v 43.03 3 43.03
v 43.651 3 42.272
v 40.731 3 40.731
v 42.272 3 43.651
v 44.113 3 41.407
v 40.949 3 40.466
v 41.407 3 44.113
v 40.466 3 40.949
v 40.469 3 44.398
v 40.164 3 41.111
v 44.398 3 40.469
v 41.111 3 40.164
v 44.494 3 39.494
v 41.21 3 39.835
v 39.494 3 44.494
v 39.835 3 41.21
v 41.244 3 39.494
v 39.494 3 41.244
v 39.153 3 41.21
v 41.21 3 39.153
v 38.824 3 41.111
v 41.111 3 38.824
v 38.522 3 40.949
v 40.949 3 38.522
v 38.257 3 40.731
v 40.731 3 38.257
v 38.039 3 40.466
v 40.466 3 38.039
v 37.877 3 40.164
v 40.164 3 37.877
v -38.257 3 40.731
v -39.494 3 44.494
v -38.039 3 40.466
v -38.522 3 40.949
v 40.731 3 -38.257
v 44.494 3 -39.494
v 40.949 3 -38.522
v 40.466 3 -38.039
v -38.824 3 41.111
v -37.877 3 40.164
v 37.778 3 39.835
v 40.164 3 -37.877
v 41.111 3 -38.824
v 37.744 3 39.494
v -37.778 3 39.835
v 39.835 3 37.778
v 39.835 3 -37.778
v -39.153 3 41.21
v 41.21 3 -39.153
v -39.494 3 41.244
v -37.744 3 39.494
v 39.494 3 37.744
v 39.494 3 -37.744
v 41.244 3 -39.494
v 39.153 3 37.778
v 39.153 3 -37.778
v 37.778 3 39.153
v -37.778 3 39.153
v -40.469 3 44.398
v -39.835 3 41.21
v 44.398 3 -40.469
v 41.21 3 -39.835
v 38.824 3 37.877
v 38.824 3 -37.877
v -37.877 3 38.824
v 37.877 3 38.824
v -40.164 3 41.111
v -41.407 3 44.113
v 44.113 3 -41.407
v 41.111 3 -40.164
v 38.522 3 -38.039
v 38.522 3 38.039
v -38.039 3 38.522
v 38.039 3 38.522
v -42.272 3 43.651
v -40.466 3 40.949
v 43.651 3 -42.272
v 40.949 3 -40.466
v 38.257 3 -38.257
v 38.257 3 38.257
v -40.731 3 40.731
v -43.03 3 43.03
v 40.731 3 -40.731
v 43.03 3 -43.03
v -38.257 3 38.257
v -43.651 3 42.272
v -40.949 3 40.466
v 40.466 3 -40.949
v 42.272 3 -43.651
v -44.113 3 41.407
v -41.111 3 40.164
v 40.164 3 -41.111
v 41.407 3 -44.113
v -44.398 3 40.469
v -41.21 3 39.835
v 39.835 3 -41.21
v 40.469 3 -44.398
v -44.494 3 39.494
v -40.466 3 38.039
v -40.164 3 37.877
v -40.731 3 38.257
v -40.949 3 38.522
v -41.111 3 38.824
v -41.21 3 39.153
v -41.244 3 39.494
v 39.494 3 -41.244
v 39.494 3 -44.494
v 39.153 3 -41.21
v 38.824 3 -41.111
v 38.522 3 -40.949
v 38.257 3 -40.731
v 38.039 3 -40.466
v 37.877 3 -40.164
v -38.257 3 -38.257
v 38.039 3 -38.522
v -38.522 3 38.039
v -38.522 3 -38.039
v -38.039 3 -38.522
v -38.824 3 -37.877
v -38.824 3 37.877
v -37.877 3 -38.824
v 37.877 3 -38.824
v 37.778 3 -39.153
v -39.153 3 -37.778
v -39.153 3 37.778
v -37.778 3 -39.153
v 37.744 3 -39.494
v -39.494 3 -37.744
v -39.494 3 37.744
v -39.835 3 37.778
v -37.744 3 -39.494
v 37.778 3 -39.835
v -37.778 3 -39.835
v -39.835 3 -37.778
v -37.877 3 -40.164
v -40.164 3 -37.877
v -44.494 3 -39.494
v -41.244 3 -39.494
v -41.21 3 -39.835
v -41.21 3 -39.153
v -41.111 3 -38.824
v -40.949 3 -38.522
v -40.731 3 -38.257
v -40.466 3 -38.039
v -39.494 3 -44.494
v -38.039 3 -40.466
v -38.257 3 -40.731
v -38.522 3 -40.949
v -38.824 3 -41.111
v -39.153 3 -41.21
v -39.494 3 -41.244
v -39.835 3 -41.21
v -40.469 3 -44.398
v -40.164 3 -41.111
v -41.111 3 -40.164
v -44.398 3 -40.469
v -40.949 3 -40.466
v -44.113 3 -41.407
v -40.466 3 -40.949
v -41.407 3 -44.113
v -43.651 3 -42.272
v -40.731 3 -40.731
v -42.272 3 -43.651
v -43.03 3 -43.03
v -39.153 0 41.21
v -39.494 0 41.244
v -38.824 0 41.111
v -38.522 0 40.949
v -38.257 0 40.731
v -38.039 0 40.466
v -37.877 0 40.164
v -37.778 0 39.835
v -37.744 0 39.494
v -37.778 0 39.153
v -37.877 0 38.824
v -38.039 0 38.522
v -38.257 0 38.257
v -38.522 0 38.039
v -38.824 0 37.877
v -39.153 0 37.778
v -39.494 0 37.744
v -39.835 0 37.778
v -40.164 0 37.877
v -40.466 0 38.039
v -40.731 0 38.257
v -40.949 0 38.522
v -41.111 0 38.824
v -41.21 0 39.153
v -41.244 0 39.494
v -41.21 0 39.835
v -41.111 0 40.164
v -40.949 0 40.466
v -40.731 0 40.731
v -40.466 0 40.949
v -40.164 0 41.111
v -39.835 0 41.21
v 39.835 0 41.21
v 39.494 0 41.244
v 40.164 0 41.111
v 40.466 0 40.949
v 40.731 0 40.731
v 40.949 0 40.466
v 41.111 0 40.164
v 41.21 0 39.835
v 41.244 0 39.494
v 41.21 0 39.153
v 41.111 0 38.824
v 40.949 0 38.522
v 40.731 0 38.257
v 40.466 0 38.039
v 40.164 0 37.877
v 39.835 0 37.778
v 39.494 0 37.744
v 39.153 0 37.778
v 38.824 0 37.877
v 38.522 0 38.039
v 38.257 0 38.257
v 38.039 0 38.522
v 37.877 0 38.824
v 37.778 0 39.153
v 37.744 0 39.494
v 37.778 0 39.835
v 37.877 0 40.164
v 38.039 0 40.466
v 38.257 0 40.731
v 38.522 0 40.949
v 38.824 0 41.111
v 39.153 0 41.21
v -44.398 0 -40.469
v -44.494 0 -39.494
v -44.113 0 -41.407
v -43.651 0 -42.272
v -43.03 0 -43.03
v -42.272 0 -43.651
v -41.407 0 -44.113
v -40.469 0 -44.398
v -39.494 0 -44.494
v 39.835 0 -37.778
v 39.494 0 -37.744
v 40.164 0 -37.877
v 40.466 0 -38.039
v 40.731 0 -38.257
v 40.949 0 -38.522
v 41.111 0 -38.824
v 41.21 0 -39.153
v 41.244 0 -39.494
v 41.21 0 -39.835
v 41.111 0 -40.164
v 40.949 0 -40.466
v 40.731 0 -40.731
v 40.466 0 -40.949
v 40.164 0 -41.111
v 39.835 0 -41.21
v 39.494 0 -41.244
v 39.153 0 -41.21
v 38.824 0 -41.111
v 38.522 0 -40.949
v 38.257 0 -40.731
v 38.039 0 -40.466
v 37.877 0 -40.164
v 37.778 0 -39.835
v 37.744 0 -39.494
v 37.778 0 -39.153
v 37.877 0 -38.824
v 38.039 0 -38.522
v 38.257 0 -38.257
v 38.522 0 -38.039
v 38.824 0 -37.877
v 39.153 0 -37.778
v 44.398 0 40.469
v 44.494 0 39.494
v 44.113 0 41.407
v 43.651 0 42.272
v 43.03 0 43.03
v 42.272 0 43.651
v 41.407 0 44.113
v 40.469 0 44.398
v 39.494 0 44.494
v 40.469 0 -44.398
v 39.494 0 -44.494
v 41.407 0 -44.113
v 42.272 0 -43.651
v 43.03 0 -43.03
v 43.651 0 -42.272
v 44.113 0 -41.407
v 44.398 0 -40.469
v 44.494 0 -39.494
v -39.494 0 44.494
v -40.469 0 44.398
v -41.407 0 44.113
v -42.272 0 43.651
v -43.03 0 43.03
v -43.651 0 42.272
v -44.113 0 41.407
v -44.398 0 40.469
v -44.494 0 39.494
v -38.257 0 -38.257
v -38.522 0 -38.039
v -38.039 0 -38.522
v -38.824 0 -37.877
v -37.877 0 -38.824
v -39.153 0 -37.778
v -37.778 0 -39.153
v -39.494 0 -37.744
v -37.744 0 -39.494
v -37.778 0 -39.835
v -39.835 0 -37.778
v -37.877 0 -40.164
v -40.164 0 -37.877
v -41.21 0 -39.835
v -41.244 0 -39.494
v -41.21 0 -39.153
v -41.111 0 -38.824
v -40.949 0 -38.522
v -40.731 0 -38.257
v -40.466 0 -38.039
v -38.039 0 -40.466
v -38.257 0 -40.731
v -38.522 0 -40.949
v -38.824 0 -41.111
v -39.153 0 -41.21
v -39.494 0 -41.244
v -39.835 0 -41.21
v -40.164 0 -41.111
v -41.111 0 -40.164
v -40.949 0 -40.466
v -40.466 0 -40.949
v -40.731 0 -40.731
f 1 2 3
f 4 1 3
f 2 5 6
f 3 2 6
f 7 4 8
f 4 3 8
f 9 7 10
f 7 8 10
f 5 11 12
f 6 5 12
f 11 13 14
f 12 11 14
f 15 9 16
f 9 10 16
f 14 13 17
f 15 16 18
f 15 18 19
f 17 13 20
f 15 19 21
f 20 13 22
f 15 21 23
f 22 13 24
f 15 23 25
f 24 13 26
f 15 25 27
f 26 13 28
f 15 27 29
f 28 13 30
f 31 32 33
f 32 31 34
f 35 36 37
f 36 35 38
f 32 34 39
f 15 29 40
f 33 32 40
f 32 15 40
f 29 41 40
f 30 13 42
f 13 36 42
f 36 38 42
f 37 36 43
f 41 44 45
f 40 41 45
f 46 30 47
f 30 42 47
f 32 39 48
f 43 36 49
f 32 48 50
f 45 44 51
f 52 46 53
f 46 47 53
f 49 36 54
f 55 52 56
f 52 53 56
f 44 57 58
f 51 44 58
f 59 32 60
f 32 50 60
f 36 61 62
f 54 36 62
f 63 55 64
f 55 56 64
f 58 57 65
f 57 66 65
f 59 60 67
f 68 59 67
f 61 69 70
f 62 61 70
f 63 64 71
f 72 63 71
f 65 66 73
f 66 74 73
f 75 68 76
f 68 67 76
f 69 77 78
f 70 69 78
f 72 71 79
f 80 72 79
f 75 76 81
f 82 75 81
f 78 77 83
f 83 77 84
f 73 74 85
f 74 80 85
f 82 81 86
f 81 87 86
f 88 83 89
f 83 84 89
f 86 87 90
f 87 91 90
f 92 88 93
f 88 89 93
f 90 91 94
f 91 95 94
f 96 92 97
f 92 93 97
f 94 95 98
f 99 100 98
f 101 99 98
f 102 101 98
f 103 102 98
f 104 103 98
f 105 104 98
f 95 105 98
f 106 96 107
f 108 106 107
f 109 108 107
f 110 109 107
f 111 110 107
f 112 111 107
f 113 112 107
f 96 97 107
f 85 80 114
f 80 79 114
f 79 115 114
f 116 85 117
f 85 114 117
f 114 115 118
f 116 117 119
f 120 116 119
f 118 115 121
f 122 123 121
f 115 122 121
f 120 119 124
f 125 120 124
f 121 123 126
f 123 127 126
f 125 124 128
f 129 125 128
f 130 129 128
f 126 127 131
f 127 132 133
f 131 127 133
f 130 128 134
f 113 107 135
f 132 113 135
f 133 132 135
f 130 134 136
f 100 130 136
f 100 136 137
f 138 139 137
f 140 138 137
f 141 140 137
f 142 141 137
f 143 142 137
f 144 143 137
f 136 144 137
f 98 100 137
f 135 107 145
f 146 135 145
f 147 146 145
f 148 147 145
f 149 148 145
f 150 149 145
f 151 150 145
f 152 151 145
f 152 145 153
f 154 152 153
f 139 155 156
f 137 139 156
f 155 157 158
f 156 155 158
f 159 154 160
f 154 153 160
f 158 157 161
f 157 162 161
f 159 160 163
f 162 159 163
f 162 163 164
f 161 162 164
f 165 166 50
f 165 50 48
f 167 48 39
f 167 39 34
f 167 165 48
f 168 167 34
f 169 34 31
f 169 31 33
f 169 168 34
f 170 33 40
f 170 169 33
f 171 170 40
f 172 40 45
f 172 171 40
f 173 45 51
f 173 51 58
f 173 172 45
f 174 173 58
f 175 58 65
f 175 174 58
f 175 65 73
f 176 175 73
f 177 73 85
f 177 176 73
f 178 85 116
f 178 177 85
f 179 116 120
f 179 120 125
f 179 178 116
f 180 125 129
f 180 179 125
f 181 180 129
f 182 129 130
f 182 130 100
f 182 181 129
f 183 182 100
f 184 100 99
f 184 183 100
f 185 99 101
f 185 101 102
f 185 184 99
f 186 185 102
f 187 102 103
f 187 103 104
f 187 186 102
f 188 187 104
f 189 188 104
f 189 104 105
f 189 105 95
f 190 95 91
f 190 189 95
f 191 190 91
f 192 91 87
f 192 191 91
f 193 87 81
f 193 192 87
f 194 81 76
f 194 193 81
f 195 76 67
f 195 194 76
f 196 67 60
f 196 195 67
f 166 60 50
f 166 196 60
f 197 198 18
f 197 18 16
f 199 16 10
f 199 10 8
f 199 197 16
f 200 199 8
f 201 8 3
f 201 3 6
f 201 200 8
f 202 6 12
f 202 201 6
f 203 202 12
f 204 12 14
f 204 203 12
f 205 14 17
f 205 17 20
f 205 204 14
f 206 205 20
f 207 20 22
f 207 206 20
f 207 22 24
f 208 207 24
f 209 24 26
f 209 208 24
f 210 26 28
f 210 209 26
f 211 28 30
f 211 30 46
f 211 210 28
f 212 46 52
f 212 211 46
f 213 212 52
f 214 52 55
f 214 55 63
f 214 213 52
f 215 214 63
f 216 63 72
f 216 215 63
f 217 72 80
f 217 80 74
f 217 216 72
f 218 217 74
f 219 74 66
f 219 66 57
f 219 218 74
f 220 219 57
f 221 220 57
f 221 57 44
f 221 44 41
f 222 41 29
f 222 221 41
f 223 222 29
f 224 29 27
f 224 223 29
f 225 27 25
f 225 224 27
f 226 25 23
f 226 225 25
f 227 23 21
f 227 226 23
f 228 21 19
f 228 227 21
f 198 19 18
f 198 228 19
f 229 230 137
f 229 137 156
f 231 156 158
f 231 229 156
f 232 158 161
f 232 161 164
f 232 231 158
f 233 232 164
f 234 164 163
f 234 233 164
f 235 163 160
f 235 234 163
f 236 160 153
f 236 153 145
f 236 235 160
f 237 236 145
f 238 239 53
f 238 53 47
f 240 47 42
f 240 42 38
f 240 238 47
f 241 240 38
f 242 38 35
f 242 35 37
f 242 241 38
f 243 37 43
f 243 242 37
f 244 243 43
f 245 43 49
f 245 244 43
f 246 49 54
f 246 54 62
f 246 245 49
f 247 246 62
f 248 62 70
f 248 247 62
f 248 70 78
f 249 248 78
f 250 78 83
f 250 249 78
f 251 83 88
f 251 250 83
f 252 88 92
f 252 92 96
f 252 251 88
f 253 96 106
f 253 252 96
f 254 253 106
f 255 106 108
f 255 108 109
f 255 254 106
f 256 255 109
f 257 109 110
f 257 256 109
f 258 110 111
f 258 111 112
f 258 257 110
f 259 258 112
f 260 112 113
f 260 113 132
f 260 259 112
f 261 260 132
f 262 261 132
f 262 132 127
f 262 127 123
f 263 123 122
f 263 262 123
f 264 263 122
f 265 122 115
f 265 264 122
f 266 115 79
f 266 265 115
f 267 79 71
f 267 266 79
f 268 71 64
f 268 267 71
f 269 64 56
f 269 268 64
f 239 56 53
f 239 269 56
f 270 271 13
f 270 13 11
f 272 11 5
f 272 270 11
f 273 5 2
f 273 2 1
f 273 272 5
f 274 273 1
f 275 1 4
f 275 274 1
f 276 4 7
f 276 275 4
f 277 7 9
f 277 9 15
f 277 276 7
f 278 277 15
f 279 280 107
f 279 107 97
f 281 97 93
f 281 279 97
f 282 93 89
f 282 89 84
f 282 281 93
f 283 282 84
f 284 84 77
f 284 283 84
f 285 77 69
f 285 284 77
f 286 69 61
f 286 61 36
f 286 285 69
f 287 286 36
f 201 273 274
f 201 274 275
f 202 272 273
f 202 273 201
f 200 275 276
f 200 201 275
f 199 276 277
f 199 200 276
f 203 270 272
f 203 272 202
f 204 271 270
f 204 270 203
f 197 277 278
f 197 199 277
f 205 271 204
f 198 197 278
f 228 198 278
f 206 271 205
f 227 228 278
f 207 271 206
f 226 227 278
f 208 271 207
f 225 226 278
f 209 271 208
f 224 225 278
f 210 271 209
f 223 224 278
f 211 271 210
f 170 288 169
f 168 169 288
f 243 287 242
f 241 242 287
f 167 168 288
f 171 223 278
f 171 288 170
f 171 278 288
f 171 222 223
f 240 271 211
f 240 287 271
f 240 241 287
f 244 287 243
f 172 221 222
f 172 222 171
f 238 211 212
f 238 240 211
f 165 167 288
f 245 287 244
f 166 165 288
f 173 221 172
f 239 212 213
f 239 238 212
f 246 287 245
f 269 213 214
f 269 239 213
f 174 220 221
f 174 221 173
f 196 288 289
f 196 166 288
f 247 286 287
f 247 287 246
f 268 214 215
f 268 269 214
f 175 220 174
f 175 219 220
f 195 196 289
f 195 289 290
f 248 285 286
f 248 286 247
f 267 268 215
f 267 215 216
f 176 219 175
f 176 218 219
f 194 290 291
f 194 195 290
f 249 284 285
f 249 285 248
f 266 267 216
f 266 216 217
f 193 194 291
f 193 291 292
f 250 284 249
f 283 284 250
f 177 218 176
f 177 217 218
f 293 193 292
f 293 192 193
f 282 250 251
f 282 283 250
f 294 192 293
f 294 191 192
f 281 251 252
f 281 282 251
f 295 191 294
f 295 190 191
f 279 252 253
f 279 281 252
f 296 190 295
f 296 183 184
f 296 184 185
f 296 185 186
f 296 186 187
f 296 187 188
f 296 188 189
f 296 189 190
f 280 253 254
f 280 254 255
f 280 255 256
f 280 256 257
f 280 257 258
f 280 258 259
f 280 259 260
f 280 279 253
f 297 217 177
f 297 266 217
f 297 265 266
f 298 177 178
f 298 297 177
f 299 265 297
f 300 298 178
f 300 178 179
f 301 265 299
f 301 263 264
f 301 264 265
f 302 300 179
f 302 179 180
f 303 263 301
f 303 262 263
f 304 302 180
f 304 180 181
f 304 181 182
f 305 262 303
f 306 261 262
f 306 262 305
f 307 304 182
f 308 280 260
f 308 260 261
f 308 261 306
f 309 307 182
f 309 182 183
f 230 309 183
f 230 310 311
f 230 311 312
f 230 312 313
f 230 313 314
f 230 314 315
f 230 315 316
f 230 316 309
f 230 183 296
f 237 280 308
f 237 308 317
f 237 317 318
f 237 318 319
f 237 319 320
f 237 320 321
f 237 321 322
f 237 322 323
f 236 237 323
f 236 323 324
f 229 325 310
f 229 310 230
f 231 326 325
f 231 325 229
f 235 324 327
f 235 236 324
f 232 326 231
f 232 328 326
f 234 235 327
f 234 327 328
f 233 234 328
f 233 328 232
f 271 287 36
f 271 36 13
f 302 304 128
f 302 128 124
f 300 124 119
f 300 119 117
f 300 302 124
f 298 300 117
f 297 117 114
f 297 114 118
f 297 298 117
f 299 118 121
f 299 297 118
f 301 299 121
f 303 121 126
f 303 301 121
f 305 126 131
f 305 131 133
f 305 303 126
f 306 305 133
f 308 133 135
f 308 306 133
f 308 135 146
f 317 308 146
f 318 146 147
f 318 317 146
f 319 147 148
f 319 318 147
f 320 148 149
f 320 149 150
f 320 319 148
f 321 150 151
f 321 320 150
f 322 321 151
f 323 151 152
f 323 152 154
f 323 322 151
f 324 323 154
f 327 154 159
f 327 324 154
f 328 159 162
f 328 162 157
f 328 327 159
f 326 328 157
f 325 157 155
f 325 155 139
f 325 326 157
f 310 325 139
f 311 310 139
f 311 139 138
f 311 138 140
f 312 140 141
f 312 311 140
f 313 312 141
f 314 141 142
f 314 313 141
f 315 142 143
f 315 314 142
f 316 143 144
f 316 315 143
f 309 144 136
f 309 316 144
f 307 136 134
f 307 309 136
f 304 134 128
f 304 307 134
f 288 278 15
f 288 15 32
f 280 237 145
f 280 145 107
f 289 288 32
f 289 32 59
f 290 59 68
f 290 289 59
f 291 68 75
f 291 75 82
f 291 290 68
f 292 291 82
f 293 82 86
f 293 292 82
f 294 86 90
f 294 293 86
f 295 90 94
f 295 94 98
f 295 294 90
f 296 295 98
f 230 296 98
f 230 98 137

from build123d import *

# Parameters (mm, degrees)
SKETCH1_R           = 1.75
BOSS_EXTRUDE1_DEPTH = 3


with BuildPart() as part:
    # Sketch1 → Boss-Extrude1 (new body)
    with BuildSketch(Plane(origin=(0, 0, 0), x_dir=(1, 0, 0), z_dir=(0, 1, 0))):
        with BuildLine():
            ThreePointArc((-44.494041124, 39.494041124), (-43.02957503, 43.02957503), (-39.494041124, 44.494041124))
            Line((-39.494041124, 44.494041124), (0, 44.494041124))
            Line((0, 44.494041124), (39.494041124, 44.494041124))
            ThreePointArc((39.494041124, 44.494041124), (43.02957503, 43.02957503), (44.494041124, 39.494041124))
            Line((44.494041124, 39.494041124), (44.494041124, 0))
            Line((44.494041124, 0), (44.494041124, -39.494041124))
            ThreePointArc((44.494041124, -39.494041124), (43.02957503, -43.02957503), (39.494041124, -44.494041124))
            Line((39.494041124, -44.494041124), (0, -44.494041124))
            Line((0, -44.494041124), (-39.494041124, -44.494041124))
            ThreePointArc((-39.494041124, -44.494041124), (-43.02957503, -43.02957503), (-44.494041124, -39.494041124))
            Line((-44.494041124, -39.494041124), (-44.494041124, 0))
            Line((-44.494041124, 0), (-44.494041124, 39.494041124))
        make_face()
        with Locations(Location((-39.494041124, -39.494041124, 0), (0, 0, 270))):
            Circle(SKETCH1_R, mode=Mode.SUBTRACT)
        with Locations(Location((-39.494041124, 39.494041124, 0), (0, 0, 270))):
            Circle(SKETCH1_R, mode=Mode.SUBTRACT)
        with Locations(Location((39.494041124, 39.494041124, 0), (0, 0, 270))):
            Circle(SKETCH1_R, mode=Mode.SUBTRACT)
        with Locations(Location((39.494041124, -39.494041124, 0), (0, 0, 270))):
            Circle(SKETCH1_R, mode=Mode.SUBTRACT)
    extrude(amount=BOSS_EXTRUDE1_DEPTH)


solid = part.part
